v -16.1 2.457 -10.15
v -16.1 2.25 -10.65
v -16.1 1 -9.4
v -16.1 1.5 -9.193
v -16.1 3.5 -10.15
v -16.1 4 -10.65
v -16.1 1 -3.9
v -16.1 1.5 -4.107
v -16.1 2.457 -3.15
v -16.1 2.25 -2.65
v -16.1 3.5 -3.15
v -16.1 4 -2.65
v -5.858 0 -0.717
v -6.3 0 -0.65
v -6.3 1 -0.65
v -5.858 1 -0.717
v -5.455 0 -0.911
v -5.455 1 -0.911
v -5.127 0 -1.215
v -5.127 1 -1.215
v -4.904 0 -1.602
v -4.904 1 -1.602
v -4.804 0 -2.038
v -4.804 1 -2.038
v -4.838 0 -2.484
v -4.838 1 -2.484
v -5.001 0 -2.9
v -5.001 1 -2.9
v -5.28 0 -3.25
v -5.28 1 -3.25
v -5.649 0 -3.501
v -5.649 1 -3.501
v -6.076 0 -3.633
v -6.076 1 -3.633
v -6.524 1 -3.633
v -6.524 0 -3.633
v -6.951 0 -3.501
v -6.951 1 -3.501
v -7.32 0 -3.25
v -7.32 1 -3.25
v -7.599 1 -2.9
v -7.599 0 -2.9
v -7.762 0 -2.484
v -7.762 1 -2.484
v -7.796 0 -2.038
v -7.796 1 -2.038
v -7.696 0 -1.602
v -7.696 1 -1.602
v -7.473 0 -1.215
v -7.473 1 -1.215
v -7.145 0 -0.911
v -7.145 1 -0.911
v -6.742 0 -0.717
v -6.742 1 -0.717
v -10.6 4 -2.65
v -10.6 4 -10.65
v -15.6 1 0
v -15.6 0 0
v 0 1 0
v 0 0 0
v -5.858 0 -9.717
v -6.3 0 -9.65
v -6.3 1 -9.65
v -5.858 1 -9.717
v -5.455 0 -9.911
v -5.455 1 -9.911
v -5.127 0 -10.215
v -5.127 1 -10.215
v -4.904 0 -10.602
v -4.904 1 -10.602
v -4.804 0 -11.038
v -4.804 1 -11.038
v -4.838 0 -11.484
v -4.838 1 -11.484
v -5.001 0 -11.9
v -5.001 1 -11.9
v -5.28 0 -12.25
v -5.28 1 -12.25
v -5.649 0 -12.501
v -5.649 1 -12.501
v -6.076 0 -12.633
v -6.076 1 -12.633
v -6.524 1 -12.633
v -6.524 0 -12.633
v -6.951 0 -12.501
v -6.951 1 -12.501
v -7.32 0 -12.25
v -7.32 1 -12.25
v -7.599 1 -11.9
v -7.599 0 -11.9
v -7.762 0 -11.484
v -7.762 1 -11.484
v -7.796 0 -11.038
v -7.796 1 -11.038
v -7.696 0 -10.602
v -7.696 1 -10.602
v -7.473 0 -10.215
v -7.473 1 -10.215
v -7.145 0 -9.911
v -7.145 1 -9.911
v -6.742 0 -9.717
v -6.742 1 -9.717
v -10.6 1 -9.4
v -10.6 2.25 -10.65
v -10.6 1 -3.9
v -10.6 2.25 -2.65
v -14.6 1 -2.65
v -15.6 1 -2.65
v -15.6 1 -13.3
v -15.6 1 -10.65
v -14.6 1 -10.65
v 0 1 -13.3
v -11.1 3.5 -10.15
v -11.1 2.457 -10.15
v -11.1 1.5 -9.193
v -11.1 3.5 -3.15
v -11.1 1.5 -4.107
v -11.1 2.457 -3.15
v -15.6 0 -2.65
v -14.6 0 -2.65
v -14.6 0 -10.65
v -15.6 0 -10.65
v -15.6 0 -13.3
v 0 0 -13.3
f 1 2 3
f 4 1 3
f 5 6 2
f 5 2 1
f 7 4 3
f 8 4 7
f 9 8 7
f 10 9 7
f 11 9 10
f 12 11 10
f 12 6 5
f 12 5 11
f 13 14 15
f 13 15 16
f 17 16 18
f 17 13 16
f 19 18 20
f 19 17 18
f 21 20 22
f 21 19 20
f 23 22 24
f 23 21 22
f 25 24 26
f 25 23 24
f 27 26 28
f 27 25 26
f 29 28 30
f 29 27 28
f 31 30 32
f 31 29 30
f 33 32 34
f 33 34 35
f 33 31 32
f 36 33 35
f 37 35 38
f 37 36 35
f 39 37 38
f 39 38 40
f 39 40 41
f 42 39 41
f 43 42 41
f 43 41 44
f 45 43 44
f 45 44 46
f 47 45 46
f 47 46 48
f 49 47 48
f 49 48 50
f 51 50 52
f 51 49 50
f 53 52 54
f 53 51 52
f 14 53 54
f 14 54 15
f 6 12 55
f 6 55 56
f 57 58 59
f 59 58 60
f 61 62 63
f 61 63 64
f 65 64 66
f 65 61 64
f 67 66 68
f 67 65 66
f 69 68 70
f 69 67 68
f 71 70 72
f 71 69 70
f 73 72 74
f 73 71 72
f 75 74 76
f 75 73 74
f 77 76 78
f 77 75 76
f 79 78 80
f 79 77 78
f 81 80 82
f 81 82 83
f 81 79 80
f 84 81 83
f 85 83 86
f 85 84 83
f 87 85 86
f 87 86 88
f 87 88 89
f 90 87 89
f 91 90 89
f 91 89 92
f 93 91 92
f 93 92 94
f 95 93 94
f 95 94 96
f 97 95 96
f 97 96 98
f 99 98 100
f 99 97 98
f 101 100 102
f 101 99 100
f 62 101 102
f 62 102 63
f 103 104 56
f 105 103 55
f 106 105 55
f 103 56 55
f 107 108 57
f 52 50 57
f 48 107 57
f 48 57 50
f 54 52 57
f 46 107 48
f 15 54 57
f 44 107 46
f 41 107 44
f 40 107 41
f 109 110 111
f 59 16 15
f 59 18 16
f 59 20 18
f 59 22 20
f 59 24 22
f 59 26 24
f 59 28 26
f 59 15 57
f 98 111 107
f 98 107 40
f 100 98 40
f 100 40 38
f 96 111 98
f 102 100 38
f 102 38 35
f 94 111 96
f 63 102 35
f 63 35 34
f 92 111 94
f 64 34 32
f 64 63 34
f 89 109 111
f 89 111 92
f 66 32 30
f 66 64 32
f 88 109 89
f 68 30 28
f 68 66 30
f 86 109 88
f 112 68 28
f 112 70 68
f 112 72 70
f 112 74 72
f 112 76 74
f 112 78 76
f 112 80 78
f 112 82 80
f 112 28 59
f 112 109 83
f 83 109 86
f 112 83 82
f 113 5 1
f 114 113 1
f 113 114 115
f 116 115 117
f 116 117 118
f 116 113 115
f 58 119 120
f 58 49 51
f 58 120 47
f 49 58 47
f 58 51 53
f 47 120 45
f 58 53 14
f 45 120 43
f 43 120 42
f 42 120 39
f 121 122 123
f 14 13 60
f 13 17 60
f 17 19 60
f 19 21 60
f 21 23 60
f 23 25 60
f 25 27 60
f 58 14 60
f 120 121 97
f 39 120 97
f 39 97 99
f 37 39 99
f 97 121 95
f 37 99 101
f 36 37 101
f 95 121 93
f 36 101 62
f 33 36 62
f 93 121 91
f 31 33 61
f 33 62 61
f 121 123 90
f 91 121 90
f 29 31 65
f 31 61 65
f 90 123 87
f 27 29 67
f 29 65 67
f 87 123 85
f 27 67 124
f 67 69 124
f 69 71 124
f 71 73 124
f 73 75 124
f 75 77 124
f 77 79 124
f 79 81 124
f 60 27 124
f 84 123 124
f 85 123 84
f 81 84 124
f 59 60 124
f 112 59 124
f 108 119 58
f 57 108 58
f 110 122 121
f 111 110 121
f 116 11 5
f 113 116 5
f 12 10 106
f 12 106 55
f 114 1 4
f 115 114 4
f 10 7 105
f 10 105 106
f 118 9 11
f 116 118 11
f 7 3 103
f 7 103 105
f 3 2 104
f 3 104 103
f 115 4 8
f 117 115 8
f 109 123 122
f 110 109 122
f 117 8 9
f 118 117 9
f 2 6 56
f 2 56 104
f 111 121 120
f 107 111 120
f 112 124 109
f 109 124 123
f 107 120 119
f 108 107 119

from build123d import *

# Parameters (mm, degrees)
SKETCH1_R           = 1.5
BOSS_EXTRUDE1_DEPTH = 1
BOSS_EXTRUDE2_DEPTH = 5.5
CUT_EXTRUDE1_DEPTH  = 5


with BuildPart() as part:
    # Sketch1 → Boss-Extrude1 (new body)
    with BuildSketch(Plane(origin=(0, 0, 0), x_dir=(1, 0, 0), z_dir=(0, 1, 0))):
        Polygon((-15.6, 0), (0, 0), (0, 13.3), (-15.6, 13.3), (-15.6, 10.65), (-14.6, 10.65), (-14.6, 2.65), (-15.6, 2.65), align=None)
        with Locations(Location((-6.3, 2.15, 0), (0, 0, 270))):
            Circle(SKETCH1_R, mode=Mode.SUBTRACT)
        with Locations(Location((-6.3, 11.15, 0), (0, 0, 270))):
            Circle(SKETCH1_R, mode=Mode.SUBTRACT)
    extrude(amount=BOSS_EXTRUDE1_DEPTH)


with BuildPart() as body_2:
    # Sketch2 → Boss-Extrude2 (new body)
    with BuildSketch(Plane.ZY.offset(16.1)):
        Polygon((-2.65, 4), (-10.65, 4), (-10.65, 2.25), (-9.4, 1), (-3.9, 1), (-2.65, 2.25), align=None)
    extrude(amount=-BOSS_EXTRUDE2_DEPTH)

    # Sketch3 → Cut-Extrude1 (cut)
    with BuildSketch(Plane.ZY.offset(16.1)):
        Polygon((-10.15, 3.5), (-10.15, 2.457106781), (-9.192893219, 1.5), (-4.107106781, 1.5), (-3.15, 2.457106781), (-3.15, 3.5), align=None)
    extrude(amount=-CUT_EXTRUDE1_DEPTH, mode=Mode.SUBTRACT)


solid = Compound([part.part, body_2.part])
